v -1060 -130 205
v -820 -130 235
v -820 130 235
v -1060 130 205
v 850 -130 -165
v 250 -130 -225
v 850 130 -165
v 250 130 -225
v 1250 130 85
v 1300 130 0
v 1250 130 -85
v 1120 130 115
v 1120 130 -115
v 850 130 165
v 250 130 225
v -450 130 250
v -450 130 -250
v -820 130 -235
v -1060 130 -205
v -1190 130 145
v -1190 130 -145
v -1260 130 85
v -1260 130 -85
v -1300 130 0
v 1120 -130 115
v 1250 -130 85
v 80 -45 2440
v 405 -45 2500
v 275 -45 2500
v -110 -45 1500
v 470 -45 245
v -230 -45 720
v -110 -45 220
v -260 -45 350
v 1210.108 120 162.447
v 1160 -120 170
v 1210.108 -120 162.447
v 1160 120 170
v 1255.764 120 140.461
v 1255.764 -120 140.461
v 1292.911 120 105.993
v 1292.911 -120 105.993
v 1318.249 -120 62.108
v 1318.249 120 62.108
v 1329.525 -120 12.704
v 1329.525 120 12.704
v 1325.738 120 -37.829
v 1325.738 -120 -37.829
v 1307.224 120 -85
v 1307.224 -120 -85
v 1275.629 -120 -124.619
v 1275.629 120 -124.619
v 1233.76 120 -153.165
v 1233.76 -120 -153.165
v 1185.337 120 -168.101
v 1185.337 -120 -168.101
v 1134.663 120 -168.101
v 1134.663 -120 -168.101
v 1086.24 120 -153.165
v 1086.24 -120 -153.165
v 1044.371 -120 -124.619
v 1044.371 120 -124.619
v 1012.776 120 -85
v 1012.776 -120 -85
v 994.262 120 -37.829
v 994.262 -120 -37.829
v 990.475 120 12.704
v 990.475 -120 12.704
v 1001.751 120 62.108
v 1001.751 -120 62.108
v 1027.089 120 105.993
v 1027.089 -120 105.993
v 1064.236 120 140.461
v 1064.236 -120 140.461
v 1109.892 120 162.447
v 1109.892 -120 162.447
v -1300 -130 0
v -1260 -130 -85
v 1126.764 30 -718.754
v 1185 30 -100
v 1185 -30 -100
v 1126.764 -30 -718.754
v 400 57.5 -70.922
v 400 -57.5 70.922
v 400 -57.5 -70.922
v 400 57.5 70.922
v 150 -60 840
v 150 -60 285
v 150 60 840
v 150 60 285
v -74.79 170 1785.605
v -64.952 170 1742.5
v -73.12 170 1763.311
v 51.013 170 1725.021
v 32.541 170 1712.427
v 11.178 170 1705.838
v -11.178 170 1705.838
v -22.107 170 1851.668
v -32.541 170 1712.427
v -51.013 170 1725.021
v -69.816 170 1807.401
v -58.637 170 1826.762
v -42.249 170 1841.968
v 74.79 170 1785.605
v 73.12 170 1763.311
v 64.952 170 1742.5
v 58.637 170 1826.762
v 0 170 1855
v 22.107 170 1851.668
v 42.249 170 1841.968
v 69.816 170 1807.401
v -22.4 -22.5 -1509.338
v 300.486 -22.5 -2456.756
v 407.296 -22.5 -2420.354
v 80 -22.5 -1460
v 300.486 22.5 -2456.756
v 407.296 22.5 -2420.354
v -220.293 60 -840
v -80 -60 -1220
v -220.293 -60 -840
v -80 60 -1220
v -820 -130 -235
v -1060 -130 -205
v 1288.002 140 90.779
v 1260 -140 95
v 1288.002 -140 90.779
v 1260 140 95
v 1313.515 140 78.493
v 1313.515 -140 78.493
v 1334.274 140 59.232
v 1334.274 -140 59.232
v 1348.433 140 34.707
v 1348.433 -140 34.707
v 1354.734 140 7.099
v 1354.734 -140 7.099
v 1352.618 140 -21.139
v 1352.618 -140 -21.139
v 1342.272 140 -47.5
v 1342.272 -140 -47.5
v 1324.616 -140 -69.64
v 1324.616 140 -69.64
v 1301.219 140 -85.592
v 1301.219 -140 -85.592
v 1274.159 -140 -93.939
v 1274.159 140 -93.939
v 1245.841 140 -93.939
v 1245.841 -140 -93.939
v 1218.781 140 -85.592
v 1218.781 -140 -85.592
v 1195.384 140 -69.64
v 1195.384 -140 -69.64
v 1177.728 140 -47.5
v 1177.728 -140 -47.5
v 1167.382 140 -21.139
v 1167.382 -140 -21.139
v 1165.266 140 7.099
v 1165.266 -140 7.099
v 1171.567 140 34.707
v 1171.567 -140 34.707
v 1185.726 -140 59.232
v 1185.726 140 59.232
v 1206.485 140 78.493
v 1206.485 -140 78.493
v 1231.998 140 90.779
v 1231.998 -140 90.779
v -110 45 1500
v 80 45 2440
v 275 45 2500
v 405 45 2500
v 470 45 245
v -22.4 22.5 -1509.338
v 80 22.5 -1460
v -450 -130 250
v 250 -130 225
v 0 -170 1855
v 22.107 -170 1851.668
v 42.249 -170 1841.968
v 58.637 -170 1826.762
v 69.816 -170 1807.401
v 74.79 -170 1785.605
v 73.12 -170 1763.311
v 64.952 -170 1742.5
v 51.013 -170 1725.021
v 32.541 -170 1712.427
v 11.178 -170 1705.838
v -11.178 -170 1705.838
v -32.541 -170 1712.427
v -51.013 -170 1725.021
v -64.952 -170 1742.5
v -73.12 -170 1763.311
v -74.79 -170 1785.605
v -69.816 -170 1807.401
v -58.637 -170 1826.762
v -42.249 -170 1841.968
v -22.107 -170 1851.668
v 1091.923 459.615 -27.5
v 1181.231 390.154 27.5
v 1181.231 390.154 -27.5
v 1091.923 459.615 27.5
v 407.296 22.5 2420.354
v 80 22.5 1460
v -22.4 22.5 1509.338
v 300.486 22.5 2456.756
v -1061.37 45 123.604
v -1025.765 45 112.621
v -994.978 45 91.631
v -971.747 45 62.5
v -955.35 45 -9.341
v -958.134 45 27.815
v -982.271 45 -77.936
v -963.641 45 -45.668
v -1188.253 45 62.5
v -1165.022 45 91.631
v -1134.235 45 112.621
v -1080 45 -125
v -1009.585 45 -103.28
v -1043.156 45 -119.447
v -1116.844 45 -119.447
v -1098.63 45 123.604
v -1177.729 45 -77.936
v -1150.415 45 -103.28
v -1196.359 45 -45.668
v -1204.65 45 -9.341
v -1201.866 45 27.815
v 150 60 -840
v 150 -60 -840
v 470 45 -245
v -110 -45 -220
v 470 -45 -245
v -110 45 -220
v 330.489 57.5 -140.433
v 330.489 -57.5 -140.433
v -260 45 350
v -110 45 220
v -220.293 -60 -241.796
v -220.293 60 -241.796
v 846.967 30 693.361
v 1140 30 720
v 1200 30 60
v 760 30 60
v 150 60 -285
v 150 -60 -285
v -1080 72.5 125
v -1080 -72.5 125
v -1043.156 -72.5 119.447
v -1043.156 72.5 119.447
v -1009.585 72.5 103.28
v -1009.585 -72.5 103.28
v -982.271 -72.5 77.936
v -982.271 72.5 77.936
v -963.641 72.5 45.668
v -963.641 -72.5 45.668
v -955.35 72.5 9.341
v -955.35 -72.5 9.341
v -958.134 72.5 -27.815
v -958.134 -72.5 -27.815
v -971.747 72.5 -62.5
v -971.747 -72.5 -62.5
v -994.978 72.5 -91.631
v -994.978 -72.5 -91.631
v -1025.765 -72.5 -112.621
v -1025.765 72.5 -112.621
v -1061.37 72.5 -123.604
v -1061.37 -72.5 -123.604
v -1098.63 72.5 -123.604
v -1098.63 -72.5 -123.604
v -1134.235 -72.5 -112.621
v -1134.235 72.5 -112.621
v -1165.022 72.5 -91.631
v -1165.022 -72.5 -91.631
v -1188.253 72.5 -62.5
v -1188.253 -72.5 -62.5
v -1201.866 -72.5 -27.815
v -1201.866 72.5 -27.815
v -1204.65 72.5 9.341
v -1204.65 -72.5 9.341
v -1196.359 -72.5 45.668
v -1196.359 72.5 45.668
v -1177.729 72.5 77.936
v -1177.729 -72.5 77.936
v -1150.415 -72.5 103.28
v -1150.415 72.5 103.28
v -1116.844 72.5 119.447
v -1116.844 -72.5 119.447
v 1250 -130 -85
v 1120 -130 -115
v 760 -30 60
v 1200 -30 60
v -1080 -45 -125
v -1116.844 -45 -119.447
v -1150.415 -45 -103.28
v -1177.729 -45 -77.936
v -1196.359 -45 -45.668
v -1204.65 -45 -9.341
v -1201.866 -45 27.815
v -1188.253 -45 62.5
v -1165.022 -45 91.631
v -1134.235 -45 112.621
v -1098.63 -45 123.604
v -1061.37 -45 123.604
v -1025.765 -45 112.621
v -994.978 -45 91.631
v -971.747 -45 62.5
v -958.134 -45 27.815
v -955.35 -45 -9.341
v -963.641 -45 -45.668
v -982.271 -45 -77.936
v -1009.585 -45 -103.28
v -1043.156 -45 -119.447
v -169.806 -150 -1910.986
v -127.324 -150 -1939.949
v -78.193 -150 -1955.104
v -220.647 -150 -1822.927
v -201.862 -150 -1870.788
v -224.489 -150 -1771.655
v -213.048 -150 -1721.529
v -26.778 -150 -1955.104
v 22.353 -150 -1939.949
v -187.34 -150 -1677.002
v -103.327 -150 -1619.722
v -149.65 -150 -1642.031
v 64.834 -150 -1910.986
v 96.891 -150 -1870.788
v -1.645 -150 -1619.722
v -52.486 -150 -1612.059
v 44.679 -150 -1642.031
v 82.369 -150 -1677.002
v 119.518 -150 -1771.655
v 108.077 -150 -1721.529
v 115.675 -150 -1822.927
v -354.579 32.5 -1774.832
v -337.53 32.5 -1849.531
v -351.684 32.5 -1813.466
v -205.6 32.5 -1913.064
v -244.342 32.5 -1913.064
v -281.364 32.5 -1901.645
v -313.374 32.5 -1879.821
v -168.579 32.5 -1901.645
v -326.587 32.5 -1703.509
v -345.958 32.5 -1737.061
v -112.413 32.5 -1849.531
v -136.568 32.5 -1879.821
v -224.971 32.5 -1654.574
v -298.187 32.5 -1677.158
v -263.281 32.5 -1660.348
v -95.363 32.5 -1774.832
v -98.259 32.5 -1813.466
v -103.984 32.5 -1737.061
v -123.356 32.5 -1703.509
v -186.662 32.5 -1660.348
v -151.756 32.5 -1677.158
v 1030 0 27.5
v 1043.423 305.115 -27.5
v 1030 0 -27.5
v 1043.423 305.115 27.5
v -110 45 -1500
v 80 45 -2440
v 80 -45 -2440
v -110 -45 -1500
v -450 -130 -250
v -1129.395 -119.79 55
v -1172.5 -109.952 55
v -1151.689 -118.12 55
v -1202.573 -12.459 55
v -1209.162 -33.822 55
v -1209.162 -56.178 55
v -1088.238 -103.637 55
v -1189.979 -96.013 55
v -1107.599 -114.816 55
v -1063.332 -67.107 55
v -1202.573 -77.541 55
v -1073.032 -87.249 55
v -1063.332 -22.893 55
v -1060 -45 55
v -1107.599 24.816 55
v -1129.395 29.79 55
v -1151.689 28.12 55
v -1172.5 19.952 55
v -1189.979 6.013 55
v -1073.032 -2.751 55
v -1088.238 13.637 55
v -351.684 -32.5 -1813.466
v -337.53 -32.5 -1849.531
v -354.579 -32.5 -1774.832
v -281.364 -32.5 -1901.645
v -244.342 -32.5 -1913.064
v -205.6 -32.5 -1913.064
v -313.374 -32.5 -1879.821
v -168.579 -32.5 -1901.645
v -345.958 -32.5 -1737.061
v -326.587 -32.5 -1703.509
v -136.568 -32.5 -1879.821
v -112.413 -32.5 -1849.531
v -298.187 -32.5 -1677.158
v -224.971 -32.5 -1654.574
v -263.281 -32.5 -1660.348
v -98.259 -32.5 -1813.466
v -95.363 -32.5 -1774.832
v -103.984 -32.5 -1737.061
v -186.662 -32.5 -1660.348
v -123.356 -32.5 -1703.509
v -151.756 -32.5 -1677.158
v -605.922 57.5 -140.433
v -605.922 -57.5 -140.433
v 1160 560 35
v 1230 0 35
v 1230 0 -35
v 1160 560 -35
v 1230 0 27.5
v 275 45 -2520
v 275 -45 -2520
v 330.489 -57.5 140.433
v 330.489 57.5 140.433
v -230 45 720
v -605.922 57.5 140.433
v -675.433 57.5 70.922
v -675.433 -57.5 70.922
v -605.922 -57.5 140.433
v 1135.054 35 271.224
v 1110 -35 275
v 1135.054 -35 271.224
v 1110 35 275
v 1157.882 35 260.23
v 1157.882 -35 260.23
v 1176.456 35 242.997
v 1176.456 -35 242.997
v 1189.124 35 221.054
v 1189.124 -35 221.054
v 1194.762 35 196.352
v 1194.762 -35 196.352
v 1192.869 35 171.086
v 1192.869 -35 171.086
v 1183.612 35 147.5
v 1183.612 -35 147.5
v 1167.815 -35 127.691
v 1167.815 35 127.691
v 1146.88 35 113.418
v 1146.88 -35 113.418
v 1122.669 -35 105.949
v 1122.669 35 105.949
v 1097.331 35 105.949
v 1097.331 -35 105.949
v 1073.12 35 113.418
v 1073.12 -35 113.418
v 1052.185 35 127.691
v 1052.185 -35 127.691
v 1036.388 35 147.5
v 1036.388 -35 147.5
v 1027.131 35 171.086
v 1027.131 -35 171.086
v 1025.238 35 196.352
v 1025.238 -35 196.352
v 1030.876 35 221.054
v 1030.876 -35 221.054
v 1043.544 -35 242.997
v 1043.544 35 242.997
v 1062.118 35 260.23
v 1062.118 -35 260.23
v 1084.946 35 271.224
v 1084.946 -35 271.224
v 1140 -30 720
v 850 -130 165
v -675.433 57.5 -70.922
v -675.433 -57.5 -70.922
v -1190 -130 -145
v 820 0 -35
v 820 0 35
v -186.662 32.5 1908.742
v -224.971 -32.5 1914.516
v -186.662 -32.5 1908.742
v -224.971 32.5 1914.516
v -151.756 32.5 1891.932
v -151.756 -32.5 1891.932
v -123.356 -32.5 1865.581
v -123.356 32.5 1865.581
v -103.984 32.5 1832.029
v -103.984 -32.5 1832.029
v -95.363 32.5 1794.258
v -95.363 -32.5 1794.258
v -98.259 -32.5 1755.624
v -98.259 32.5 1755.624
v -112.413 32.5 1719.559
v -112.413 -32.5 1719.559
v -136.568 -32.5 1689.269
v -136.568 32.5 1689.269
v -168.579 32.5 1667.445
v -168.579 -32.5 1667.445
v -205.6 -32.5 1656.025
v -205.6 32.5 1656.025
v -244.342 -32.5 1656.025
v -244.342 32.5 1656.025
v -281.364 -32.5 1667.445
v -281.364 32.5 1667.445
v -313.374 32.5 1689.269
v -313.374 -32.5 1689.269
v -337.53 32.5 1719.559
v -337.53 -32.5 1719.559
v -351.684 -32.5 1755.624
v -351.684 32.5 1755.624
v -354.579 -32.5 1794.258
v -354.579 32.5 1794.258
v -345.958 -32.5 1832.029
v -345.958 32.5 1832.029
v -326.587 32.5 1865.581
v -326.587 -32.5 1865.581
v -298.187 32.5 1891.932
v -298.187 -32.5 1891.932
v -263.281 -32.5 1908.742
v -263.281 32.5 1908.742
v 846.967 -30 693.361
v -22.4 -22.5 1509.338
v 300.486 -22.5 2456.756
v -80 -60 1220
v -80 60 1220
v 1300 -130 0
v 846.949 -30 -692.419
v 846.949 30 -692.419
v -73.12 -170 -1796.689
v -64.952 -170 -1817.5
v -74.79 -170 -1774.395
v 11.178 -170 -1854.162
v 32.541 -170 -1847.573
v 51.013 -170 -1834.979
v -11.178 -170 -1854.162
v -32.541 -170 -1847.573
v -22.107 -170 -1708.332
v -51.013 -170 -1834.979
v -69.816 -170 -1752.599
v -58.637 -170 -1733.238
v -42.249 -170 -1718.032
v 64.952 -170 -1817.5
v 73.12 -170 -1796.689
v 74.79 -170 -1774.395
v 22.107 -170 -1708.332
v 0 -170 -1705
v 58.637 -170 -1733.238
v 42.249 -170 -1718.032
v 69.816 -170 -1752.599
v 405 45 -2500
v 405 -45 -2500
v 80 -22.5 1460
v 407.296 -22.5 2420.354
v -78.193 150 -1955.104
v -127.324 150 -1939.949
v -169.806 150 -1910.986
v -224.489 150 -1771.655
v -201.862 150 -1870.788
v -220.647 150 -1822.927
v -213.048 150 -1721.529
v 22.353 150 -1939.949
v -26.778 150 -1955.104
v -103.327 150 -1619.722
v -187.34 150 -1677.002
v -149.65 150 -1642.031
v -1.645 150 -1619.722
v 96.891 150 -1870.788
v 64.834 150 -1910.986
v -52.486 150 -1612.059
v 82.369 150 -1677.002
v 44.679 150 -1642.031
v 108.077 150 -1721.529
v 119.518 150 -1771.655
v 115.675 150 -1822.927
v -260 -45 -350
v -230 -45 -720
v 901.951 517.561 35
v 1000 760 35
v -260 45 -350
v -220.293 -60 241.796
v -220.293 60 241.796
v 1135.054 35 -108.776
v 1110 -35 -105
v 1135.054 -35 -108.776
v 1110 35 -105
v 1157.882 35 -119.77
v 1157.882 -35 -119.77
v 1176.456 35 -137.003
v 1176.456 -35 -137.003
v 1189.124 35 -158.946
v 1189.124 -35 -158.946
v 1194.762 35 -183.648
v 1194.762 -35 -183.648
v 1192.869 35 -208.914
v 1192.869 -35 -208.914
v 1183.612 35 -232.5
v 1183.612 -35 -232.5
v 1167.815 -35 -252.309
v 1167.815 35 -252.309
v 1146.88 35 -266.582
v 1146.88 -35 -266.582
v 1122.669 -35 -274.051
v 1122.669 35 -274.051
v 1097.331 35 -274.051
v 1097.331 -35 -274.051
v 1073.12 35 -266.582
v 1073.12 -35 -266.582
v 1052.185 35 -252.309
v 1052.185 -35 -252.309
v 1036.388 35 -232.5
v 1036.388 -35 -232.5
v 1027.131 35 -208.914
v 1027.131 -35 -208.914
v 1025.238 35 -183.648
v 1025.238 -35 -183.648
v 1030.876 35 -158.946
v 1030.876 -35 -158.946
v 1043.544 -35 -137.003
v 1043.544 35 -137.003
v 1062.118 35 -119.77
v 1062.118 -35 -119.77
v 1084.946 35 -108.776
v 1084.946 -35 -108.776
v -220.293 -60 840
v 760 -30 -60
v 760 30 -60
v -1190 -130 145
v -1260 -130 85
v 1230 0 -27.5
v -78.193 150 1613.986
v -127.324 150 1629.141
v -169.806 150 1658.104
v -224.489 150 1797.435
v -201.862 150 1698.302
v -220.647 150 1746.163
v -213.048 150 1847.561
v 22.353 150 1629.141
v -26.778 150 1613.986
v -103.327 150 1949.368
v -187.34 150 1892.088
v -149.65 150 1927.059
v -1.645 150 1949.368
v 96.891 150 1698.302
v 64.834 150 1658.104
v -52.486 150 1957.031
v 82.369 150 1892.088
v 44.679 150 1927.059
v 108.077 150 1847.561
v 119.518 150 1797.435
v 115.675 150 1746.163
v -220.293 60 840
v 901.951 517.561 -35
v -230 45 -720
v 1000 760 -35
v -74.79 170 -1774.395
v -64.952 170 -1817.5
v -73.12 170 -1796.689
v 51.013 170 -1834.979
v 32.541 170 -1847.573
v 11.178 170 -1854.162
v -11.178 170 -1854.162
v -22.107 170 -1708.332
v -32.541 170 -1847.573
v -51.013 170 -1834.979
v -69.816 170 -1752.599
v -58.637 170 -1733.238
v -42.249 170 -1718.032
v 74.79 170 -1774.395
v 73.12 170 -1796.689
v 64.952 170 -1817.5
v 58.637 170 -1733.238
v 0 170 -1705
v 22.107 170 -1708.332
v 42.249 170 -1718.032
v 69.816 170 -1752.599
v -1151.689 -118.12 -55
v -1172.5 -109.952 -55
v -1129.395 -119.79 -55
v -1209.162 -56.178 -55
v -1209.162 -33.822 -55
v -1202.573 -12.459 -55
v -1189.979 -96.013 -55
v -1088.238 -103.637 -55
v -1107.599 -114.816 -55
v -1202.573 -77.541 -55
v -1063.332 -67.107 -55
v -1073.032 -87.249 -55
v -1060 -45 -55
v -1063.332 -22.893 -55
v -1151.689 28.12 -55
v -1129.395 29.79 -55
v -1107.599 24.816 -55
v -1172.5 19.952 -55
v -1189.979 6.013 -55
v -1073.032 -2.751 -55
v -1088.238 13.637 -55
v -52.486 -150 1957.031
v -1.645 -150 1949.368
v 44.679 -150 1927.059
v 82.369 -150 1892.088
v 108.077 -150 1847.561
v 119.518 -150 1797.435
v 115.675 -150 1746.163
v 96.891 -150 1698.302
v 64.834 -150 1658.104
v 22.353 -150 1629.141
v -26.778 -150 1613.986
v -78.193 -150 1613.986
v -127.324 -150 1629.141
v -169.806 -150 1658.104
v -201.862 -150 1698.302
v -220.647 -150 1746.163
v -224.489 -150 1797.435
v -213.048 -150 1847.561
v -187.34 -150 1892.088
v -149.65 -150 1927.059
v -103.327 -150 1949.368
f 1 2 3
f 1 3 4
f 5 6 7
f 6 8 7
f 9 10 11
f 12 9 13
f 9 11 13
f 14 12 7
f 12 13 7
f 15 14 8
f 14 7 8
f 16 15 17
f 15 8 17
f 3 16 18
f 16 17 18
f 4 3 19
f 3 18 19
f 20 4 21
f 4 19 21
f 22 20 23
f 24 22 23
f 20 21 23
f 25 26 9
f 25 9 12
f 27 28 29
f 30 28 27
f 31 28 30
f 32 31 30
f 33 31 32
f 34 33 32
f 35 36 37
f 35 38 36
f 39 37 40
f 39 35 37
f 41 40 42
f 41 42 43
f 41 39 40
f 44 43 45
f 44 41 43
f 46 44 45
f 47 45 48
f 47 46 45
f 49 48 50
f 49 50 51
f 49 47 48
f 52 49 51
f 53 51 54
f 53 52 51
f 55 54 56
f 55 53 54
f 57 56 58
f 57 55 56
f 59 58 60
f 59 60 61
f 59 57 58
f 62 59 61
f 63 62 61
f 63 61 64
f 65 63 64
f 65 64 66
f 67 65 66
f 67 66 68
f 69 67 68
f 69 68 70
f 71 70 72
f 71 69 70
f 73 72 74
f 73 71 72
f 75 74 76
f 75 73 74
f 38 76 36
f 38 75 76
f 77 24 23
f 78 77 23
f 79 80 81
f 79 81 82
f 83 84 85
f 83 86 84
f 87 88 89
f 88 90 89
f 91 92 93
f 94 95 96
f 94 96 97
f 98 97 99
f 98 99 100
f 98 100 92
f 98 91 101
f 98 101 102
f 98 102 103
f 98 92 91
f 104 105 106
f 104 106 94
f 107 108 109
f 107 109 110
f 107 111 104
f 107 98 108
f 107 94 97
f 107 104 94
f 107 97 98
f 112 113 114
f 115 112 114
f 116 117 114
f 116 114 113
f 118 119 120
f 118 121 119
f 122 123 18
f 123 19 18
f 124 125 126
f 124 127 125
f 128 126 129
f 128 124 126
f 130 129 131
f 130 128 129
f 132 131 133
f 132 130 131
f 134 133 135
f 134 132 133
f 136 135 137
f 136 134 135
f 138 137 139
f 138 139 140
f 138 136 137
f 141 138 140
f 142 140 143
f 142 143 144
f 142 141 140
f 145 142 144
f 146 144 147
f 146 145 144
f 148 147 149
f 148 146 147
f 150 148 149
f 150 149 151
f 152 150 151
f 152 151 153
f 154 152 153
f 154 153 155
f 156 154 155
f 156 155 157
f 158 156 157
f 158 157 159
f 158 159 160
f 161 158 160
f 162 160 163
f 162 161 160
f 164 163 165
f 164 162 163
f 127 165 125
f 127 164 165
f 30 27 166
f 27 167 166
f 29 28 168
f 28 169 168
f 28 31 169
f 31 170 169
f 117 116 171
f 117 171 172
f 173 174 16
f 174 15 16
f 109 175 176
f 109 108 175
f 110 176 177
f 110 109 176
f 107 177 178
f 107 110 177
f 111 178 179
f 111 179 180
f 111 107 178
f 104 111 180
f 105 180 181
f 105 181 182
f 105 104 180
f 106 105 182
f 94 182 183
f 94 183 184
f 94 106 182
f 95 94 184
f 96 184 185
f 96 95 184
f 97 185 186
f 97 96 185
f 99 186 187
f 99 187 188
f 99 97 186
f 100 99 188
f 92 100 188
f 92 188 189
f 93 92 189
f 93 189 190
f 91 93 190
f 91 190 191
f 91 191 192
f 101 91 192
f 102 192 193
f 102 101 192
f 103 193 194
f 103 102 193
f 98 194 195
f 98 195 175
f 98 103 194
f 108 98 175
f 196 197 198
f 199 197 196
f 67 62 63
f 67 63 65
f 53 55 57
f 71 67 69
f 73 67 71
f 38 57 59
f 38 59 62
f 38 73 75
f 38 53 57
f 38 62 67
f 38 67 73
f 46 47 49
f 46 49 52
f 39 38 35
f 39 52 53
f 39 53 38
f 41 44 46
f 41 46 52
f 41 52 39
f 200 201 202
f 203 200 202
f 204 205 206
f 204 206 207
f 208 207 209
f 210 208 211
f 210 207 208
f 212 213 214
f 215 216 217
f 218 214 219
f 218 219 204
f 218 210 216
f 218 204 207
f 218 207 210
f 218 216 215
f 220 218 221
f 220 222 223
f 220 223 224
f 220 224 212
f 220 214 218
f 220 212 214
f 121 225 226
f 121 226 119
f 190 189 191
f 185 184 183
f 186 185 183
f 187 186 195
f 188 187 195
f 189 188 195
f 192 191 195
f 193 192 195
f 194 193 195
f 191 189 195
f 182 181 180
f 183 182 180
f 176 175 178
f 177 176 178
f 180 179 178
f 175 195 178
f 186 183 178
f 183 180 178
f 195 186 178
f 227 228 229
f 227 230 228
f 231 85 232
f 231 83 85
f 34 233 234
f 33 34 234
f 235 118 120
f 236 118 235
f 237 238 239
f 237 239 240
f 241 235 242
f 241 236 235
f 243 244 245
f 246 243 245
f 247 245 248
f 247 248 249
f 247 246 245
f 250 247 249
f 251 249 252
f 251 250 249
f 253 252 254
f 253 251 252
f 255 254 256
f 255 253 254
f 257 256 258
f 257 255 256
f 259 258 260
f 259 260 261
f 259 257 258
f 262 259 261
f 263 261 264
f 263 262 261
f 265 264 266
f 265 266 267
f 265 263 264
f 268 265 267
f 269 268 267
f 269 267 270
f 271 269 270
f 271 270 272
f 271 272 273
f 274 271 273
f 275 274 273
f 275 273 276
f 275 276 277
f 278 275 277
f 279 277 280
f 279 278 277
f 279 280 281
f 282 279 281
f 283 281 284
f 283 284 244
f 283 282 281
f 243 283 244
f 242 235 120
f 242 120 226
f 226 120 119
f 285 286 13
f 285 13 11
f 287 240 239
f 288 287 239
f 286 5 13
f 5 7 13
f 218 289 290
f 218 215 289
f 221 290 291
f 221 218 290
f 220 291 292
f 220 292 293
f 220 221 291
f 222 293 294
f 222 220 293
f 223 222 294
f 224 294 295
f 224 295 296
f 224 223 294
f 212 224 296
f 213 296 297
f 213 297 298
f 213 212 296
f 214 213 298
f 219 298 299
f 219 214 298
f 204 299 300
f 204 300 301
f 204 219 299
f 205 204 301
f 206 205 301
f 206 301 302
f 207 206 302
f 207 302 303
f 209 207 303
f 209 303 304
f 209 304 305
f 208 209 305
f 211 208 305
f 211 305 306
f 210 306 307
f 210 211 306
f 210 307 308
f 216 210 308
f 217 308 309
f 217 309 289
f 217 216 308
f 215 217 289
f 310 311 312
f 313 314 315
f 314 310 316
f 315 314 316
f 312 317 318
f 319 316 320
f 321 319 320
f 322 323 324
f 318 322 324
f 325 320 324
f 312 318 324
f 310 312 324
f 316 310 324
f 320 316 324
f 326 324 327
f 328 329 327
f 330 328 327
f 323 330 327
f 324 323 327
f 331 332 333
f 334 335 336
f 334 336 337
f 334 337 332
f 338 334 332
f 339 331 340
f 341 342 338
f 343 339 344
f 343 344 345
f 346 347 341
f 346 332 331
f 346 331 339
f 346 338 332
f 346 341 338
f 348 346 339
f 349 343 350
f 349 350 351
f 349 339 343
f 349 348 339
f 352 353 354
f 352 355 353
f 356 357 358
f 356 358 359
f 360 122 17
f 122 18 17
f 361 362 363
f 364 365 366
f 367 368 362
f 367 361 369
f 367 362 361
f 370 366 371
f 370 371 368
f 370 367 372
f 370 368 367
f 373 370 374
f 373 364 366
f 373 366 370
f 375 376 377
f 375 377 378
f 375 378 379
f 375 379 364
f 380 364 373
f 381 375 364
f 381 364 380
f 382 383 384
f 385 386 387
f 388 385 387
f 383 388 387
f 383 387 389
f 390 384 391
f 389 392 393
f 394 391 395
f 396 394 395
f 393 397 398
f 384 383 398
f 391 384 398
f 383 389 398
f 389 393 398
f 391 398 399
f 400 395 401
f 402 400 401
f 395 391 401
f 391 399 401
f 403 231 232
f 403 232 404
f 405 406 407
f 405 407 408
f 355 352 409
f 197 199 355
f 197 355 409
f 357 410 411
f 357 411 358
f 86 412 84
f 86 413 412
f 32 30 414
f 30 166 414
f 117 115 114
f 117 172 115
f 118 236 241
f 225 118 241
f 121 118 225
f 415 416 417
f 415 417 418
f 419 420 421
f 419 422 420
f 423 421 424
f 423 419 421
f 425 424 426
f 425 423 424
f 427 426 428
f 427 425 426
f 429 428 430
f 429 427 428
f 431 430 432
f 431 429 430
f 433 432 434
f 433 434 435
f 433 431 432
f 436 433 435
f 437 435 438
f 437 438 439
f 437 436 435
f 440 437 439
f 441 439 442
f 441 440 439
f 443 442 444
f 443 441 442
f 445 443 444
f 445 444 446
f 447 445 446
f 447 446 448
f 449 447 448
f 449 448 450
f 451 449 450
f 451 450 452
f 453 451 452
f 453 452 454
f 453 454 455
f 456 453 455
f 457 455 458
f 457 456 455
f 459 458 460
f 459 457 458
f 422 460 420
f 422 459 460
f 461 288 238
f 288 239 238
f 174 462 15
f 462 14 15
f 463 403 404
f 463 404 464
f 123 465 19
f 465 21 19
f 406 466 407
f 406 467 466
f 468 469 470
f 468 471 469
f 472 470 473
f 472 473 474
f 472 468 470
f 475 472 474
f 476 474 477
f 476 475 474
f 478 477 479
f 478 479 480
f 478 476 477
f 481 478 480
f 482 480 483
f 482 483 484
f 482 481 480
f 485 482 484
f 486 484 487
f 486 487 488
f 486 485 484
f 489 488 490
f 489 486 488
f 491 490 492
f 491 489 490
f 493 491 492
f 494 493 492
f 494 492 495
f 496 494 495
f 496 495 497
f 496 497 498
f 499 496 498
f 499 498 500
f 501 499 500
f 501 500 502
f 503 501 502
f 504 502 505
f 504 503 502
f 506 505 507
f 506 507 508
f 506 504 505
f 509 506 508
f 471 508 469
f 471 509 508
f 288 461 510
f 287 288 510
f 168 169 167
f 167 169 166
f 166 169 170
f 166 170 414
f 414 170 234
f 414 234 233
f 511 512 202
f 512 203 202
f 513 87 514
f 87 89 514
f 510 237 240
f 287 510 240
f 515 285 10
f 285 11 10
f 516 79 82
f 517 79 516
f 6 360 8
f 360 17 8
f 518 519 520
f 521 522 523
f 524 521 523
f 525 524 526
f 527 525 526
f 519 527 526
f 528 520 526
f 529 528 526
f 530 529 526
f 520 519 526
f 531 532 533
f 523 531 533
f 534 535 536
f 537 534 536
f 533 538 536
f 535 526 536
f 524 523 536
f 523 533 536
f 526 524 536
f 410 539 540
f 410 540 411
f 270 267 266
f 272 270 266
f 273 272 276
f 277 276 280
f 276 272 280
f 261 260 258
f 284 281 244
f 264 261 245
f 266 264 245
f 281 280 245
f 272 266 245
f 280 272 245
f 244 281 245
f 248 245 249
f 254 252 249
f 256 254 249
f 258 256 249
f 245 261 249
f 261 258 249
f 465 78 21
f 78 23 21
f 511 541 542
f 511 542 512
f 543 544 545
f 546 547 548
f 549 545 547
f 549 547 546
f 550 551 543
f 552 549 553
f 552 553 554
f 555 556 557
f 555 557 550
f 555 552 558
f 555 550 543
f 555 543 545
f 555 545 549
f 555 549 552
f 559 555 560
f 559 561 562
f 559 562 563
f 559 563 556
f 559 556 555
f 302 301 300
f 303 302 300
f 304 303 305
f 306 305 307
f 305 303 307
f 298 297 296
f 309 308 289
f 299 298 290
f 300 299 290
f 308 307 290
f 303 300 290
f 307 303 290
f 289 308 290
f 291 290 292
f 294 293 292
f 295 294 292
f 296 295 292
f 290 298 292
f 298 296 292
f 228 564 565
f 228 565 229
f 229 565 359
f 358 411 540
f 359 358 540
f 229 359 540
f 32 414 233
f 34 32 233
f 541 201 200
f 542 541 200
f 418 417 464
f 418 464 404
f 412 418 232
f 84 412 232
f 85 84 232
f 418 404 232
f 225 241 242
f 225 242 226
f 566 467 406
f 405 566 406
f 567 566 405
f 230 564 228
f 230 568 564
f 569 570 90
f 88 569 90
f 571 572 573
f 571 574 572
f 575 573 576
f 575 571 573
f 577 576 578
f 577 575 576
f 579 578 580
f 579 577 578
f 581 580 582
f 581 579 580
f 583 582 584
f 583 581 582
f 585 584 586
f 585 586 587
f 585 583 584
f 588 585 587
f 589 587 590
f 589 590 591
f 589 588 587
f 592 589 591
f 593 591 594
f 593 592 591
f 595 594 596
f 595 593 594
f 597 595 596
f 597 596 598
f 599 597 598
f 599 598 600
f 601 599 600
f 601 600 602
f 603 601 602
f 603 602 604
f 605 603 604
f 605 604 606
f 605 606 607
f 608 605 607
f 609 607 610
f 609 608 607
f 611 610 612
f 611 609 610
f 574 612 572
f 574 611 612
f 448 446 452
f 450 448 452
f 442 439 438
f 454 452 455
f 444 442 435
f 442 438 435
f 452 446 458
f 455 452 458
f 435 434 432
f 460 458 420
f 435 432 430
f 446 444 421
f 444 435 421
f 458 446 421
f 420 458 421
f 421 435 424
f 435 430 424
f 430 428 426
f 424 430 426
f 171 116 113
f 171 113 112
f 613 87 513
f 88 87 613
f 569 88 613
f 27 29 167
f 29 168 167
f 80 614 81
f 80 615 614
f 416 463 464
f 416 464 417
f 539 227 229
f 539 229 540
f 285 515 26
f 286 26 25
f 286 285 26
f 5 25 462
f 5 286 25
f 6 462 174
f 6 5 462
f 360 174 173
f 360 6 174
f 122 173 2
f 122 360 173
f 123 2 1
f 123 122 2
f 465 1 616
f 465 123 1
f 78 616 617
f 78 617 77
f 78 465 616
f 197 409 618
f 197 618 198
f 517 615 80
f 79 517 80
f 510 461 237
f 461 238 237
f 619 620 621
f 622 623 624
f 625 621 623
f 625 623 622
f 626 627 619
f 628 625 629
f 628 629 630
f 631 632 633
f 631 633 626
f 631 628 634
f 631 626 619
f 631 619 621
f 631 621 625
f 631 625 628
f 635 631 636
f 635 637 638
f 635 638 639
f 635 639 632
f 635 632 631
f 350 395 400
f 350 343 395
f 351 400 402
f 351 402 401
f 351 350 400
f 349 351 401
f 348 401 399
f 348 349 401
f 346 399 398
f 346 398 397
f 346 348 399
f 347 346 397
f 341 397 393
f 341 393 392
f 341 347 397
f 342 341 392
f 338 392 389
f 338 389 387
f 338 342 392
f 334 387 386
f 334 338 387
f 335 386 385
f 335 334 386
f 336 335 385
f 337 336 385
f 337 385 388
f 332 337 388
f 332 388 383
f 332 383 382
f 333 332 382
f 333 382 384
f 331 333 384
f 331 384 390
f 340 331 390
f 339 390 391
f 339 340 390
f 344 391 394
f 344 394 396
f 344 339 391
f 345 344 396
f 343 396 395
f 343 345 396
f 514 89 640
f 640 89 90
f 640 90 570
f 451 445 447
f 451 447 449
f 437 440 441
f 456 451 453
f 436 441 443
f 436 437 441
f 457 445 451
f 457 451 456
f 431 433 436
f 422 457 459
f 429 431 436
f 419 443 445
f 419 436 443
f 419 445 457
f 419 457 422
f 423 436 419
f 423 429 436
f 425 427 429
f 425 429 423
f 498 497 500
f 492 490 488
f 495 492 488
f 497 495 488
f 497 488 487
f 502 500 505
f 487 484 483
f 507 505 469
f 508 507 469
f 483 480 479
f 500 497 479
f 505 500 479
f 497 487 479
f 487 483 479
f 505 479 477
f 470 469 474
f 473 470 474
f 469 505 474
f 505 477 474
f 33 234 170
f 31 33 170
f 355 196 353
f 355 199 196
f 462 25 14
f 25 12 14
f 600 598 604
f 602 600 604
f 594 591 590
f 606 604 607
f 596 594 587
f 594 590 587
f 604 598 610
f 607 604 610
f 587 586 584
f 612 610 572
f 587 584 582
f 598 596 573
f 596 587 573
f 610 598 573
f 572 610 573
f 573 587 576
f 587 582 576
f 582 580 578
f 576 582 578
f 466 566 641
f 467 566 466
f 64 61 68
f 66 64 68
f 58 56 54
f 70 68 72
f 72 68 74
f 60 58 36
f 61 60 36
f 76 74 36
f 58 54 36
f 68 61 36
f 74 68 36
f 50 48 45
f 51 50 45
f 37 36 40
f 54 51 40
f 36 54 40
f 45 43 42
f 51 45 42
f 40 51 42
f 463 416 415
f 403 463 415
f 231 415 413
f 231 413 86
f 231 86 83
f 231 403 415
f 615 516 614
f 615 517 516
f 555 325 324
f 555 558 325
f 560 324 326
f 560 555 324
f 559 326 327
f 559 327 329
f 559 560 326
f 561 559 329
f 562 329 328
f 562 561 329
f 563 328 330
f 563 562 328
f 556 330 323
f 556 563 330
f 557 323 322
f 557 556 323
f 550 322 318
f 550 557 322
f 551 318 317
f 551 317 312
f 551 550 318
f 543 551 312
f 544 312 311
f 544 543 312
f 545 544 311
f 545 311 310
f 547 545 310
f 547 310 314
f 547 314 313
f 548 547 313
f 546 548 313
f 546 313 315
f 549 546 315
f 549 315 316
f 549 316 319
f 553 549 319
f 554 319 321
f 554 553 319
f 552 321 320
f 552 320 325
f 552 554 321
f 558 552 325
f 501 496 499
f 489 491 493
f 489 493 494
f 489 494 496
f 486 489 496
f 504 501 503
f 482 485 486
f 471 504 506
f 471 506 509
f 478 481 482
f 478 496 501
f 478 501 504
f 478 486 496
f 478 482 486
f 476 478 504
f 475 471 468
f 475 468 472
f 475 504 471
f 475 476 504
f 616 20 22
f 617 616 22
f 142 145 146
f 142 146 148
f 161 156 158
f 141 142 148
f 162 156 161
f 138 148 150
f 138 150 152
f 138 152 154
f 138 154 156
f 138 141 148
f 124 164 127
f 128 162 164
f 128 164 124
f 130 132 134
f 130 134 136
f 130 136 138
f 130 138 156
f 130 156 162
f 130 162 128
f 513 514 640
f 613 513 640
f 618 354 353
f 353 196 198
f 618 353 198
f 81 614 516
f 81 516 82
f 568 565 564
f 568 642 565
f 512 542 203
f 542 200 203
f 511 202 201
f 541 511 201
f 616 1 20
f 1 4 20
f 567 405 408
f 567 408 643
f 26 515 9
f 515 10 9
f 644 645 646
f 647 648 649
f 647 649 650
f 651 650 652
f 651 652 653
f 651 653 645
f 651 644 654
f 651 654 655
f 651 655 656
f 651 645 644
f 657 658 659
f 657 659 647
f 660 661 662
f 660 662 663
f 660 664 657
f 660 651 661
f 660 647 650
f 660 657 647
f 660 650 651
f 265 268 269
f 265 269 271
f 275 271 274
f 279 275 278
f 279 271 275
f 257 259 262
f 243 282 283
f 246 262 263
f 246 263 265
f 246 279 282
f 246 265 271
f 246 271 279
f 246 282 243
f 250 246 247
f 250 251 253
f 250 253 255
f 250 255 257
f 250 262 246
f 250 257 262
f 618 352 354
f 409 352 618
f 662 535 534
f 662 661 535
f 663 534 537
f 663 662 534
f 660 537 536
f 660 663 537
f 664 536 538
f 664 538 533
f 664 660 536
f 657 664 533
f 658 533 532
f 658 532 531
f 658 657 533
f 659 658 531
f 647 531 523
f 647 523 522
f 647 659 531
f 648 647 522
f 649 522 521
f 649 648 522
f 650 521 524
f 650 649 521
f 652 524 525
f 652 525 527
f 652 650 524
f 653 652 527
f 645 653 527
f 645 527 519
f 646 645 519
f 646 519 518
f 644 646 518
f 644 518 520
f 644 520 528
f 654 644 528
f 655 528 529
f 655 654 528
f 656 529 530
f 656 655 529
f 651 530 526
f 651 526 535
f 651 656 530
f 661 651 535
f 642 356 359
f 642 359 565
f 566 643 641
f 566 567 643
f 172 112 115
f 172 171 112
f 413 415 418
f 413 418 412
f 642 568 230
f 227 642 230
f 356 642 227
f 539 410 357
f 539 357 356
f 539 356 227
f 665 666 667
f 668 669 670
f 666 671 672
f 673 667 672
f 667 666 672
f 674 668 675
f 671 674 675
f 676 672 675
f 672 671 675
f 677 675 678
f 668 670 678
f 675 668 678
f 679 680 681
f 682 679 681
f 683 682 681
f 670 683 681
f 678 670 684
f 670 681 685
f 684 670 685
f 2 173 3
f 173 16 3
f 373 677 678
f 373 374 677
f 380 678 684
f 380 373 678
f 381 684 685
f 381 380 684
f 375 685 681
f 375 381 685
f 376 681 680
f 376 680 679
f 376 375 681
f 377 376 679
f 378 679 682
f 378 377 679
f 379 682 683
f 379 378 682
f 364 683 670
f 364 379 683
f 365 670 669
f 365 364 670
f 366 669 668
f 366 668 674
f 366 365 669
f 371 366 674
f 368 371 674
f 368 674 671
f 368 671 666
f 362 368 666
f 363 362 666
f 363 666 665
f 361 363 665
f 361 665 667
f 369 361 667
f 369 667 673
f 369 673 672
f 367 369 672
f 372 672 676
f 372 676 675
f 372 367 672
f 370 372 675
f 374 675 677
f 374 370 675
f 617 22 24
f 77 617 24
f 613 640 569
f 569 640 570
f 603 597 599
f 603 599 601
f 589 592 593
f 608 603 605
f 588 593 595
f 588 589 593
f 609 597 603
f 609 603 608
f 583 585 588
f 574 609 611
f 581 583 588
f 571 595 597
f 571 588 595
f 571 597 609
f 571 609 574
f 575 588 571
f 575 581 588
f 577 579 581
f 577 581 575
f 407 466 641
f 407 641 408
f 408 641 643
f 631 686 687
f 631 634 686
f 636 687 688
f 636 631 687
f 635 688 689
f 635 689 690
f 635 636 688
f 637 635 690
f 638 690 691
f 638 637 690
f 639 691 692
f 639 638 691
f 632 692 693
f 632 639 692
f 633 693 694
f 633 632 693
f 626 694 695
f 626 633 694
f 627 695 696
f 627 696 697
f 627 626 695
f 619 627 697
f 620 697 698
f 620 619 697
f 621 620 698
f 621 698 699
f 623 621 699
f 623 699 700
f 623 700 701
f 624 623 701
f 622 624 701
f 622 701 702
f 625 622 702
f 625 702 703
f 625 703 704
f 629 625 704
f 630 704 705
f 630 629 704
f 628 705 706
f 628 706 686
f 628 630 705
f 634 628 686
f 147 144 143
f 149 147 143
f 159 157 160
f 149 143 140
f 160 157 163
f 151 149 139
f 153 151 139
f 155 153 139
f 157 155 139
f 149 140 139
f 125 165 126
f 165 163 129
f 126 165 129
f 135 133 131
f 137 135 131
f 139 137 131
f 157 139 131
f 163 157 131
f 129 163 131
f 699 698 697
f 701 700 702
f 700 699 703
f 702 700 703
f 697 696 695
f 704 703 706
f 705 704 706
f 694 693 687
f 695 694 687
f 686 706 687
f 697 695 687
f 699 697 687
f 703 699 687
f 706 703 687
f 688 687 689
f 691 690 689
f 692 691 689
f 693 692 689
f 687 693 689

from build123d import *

# Parameters (mm, degrees)
BOSS_EXTRUDE1_DEPTH  = 130
BOSS_EXTRUDE2_DEPTH  = 57.5
SKETCH3_R            = 125
BOSS_EXTRUDE3_DEPTH  = 72.5
BOSS_EXTRUDE4_DEPTH  = 45
BOSS_EXTRUDE5_DEPTH  = 45
BOSS_EXTRUDE6_DEPTH  = 60
BOSS_EXTRUDE7_DEPTH  = 22.5
BOSS_EXTRUDE8_DEPTH  = 60
BOSS_EXTRUDE9_DEPTH  = 22.5
BOSS_EXTRUDE10_DEPTH = 30
BOSS_EXTRUDE11_DEPTH = 30
BOSS_EXTRUDE12_DEPTH = 35
BOSS_EXTRUDE13_DEPTH = 27.5
SKETCH14_R           = 172.485593128
BOSS_EXTRUDE14_DEPTH = 150
SKETCH15_R           = 172.485593128
BOSS_EXTRUDE15_DEPTH = 150
SKETCH16_R           = 170
BOSS_EXTRUDE16_DEPTH = 120
SKETCH17_R           = 75
BOSS_EXTRUDE17_DEPTH = 170
SKETCH18_R           = 75
BOSS_EXTRUDE18_DEPTH = 170
SKETCH19_R           = 95
BOSS_EXTRUDE19_DEPTH = 140
SKETCH20_R           = 129.971186256
BOSS_EXTRUDE20_DEPTH = 32.5
SKETCH21_R           = 85
BOSS_EXTRUDE21_DEPTH = 35
SKETCH22_R           = 129.971186256
BOSS_EXTRUDE22_DEPTH = 32.5
SKETCH23_R           = 85
BOSS_EXTRUDE23_DEPTH = 35
SKETCH24_R           = 125
BOSS_EXTRUDE24_DEPTH = 45
SKETCH25_R           = 75
BOSS_EXTRUDE25_DEPTH = 55


with BuildPart() as part:
    # Sketch1 → Boss-Extrude1 (new, symmetric)
    with BuildSketch(Plane(origin=(0, 0, 0), x_dir=(1, 0, 0), z_dir=(0, 1, 0))):
        Polygon((-1300, 0), (-1260, 85), (-1190, 145), (-1060, 205), (-820, 235), (-450, 250), (250, 225), (850, 165), (1120, 115), (1250, 85), (1300, 0), (1250, -85), (1120, -115), (850, -165), (250, -225), (-450, -250), (-820, -235), (-1060, -205), (-1190, -145), (-1260, -85), align=None)
    extrude(amount=BOSS_EXTRUDE1_DEPTH, both=True)


with BuildPart() as body_2:
    # Sketch2 → Boss-Extrude2 (new, symmetric)
    with BuildSketch(Plane(origin=(0, 0, 0), x_dir=(1, 0, 0), z_dir=(0, 1, 0))):
        Polygon((400, 25), (400, 70.922011884), (362.961005942, 107.961005942), (330.489239933, 140.432771951), (280, 140.432771951), (-560, 140.432771951), (-605.922011884, 140.432771951), (-638.393777893, 107.961005942), (-675.432771951, 70.922011884), (-675.432771951, 25), (-675.432771951, -25), (-675.432771951, -70.922011884), (-638.393777893, -107.961005942), (-605.922011884, -140.432771951), (-560, -140.432771951), (280, -140.432771951), (330.489239933, -140.432771951), (362.961005942, -107.961005942), (400, -70.922011884), (400, -25), align=None)
    extrude(amount=BOSS_EXTRUDE2_DEPTH, both=True)


with BuildPart() as body_3:
    # Sketch3 → Boss-Extrude3 (new, symmetric)
    with BuildSketch(Plane(origin=(0, 0, 0), x_dir=(1, 0, 0), z_dir=(0, 1, 0))):
        with Locations(Location((-1080, 0, 0), (0, 0, 270))):
            Circle(SKETCH3_R)
    extrude(amount=BOSS_EXTRUDE3_DEPTH, both=True)


with BuildPart() as body_4:
    # Sketch4 → Boss-Extrude4 (new, symmetric)
    with BuildSketch(Plane(origin=(0, 0, 0), x_dir=(1, 0, 0), z_dir=(0, 1, 0))):
        Polygon((-110, 220), (470, 245), (405, 2500), (275, 2520), (80, 2440), (-110, 1500), (-230, 720), (-260, 350), align=None)
    extrude(amount=BOSS_EXTRUDE4_DEPTH, both=True)


with BuildPart() as body_5:
    # Sketch5 → Boss-Extrude5 (new, symmetric)
    with BuildSketch(Plane(origin=(0, 0, 0), x_dir=(1, 0, 0), z_dir=(0, 1, 0))):
        Polygon((-110, -220), (470, -245), (405, -2500), (275, -2500), (80, -2440), (-110, -1500), (-230, -720), (-260, -350), align=None)
    extrude(amount=BOSS_EXTRUDE5_DEPTH, both=True)


with BuildPart() as body_6:
    # Sketch6 → Boss-Extrude6 (new, symmetric)
    with BuildSketch(Plane(origin=(0, 0, 0), x_dir=(1, 0, 0), z_dir=(0, 1, 0))):
        Polygon((-220.292993631, 241.796178344), (150, 285), (150, 840), (-80, 1220), (-220.292993631, 840), align=None)
    extrude(amount=BOSS_EXTRUDE6_DEPTH, both=True)


with BuildPart() as body_7:
    # Sketch7 → Boss-Extrude7 (new, symmetric)
    with BuildSketch(Plane(origin=(0, 0, 0), x_dir=(1, 0, 0), z_dir=(0, 1, 0))):
        Polygon((80, 1460), (407.295770497, 2420.35442354), (300.486303062, 2456.755866677), (-22.400496489, 1509.338288439), align=None)
    extrude(amount=BOSS_EXTRUDE7_DEPTH, both=True)


with BuildPart() as body_8:
    # Sketch8 → Boss-Extrude8 (new, symmetric)
    with BuildSketch(Plane(origin=(0, 0, 0), x_dir=(1, 0, 0), z_dir=(0, 1, 0))):
        Polygon((-220.292993631, -241.796178344), (150, -285), (150, -840), (-80, -1220), (-220.292993631, -840), align=None)
    extrude(amount=BOSS_EXTRUDE8_DEPTH, both=True)


with BuildPart() as body_9:
    # Sketch9 → Boss-Extrude9 (new, symmetric)
    with BuildSketch(Plane(origin=(0, 0, 0), x_dir=(1, 0, 0), z_dir=(0, 1, 0))):
        Polygon((80, -1460), (407.295770497, -2420.35442354), (300.486303062, -2456.755866677), (-22.400496489, -1509.338288439), align=None)
    extrude(amount=BOSS_EXTRUDE9_DEPTH, both=True)


with BuildPart() as body_10:
    # Sketch10 → Boss-Extrude10 (new, symmetric)
    with BuildSketch(Plane(origin=(0, 0, 0), x_dir=(1, 0, 0), z_dir=(0, 1, 0))):
        Polygon((760, 60), (1185, 100), (1126.764302373, 718.754287282), (846.948827, 692.418713129), align=None)
    extrude(amount=BOSS_EXTRUDE10_DEPTH, both=True)


with BuildPart() as body_11:
    # Sketch11 → Boss-Extrude11 (new, symmetric)
    with BuildSketch(Plane(origin=(0, 0, 0), x_dir=(1, 0, 0), z_dir=(0, 1, 0))):
        Polygon((760, -60), (1200, -60), (1140, -720), (846.967213115, -693.360655738), align=None)
    extrude(amount=BOSS_EXTRUDE11_DEPTH, both=True)


with BuildPart() as body_12:
    # Sketch12 → Boss-Extrude12 (new, symmetric)
    with BuildSketch(Plane.XY):
        Polygon((820, 0), (1230, 0), (1160, 560), (1000, 760), (901.951219512, 517.56097561), align=None)
    extrude(amount=BOSS_EXTRUDE12_DEPTH, both=True)


with BuildPart() as body_13:
    # Sketch13 → Boss-Extrude13 (new, symmetric)
    with BuildSketch(Plane.XY):
        Polygon((1030, 0), (1230, 0), (1181.230769231, 390.153846154), (1091.923076923, 459.615384615), (1043.423076923, 305.115384615), align=None)
    extrude(amount=BOSS_EXTRUDE13_DEPTH, both=True)


with BuildPart() as body_14:
    # Sketch14 → Boss-Extrude14 (new, symmetric)
    with BuildSketch(Plane(origin=(0, 0, 0), x_dir=(1, 0, 0), z_dir=(0, 1, 0))):
        with Locations(Location((-52.485593128, 1784.544960313, 0), (0, 0, 270))):
            Circle(SKETCH14_R)
    extrude(amount=BOSS_EXTRUDE14_DEPTH, both=True)


with BuildPart() as body_15:
    # Sketch15 → Boss-Extrude15 (new, symmetric)
    with BuildSketch(Plane(origin=(0, 0, 0), x_dir=(1, 0, 0), z_dir=(0, 1, 0))):
        with Locations(Location((-52.485593128, -1784.544960313, 0), (0, 0, 270))):
            Circle(SKETCH15_R)
    extrude(amount=BOSS_EXTRUDE15_DEPTH, both=True)


with BuildPart() as body_16:
    # Sketch16 → Boss-Extrude16 (new, symmetric)
    with BuildSketch(Plane(origin=(0, 0, 0), x_dir=(1, 0, 0), z_dir=(0, 1, 0))):
        with Locations(Location((1160, 0, 0), (0, 0, 270))):
            Circle(SKETCH16_R)
    extrude(amount=BOSS_EXTRUDE16_DEPTH, both=True)


with BuildPart() as body_17:
    # Sketch17 → Boss-Extrude17 (new, symmetric)
    with BuildSketch(Plane(origin=(0, 0, 0), x_dir=(1, 0, 0), z_dir=(0, 1, 0))):
        with Locations(Location((0, 1780, 0), (0, 0, 270))):
            Circle(SKETCH17_R)
    extrude(amount=BOSS_EXTRUDE17_DEPTH, both=True)


with BuildPart() as body_18:
    # Sketch18 → Boss-Extrude18 (new, symmetric)
    with BuildSketch(Plane(origin=(0, 0, 0), x_dir=(1, 0, 0), z_dir=(0, 1, 0))):
        with Locations(Location((0, -1780, 0), (0, 0, 270))):
            Circle(SKETCH18_R)
    extrude(amount=BOSS_EXTRUDE18_DEPTH, both=True)


with BuildPart() as body_19:
    # Sketch19 → Boss-Extrude19 (new, symmetric)
    with BuildSketch(Plane(origin=(0, 0, 0), x_dir=(1, 0, 0), z_dir=(0, 1, 0))):
        with Locations(Location((1260, 0, 0), (0, 0, 270))):
            Circle(SKETCH19_R)
    extrude(amount=BOSS_EXTRUDE19_DEPTH, both=True)


with BuildPart() as body_20:
    # Sketch20 → Boss-Extrude20 (new, symmetric)
    with BuildSketch(Plane(origin=(0, 0, 0), x_dir=(1, 0, 0), z_dir=(0, 1, 0))):
        with Locations(Location((-224.971186256, 1784.544960313, 0), (0, 0, 270))):
            Circle(SKETCH20_R)
    extrude(amount=BOSS_EXTRUDE20_DEPTH, both=True)


with BuildPart() as body_21:
    # Sketch21 → Boss-Extrude21 (new, symmetric)
    with BuildSketch(Plane(origin=(0, 0, 0), x_dir=(1, 0, 0), z_dir=(0, 1, 0))):
        with Locations(Location((1110, 190, 0), (0, 0, 270))):
            Circle(SKETCH21_R)
    extrude(amount=BOSS_EXTRUDE21_DEPTH, both=True)


with BuildPart() as body_22:
    # Sketch22 → Boss-Extrude22 (new, symmetric)
    with BuildSketch(Plane(origin=(0, 0, 0), x_dir=(1, 0, 0), z_dir=(0, 1, 0))):
        with Locations(Location((-224.971186256, -1784.544960313, 0), (0, 0, 270))):
            Circle(SKETCH22_R)
    extrude(amount=BOSS_EXTRUDE22_DEPTH, both=True)


with BuildPart() as body_23:
    # Sketch23 → Boss-Extrude23 (new, symmetric)
    with BuildSketch(Plane(origin=(0, 0, 0), x_dir=(1, 0, 0), z_dir=(0, 1, 0))):
        with Locations(Location((1110, -190, 0), (0, 0, 270))):
            Circle(SKETCH23_R)
    extrude(amount=BOSS_EXTRUDE23_DEPTH, both=True)


with BuildPart() as body_24:
    # Sketch24 → Boss-Extrude24 (new, symmetric)
    with BuildSketch(Plane(origin=(0, 0, 0), x_dir=(1, 0, 0), z_dir=(0, 1, 0))):
        with Locations(Location((-1080, 0, 0), (0, 0, 90))):
            Circle(SKETCH24_R)
    extrude(amount=BOSS_EXTRUDE24_DEPTH, both=True)


with BuildPart() as body_25:
    # Sketch25 → Boss-Extrude25 (new, symmetric)
    with BuildSketch(Plane.XY):
        with Locations((-1135, -45)):
            Circle(SKETCH25_R)
    extrude(amount=BOSS_EXTRUDE25_DEPTH, both=True)


solid = Compound([part.part, body_2.part, body_3.part, body_4.part, body_5.part, body_6.part, body_7.part, body_8.part, body_9.part, body_10.part, body_11.part, body_12.part, body_13.part, body_14.part, body_15.part, body_16.part, body_17.part, body_18.part, body_19.part, body_20.part, body_21.part, body_22.part, body_23.part, body_24.part, body_25.part])
